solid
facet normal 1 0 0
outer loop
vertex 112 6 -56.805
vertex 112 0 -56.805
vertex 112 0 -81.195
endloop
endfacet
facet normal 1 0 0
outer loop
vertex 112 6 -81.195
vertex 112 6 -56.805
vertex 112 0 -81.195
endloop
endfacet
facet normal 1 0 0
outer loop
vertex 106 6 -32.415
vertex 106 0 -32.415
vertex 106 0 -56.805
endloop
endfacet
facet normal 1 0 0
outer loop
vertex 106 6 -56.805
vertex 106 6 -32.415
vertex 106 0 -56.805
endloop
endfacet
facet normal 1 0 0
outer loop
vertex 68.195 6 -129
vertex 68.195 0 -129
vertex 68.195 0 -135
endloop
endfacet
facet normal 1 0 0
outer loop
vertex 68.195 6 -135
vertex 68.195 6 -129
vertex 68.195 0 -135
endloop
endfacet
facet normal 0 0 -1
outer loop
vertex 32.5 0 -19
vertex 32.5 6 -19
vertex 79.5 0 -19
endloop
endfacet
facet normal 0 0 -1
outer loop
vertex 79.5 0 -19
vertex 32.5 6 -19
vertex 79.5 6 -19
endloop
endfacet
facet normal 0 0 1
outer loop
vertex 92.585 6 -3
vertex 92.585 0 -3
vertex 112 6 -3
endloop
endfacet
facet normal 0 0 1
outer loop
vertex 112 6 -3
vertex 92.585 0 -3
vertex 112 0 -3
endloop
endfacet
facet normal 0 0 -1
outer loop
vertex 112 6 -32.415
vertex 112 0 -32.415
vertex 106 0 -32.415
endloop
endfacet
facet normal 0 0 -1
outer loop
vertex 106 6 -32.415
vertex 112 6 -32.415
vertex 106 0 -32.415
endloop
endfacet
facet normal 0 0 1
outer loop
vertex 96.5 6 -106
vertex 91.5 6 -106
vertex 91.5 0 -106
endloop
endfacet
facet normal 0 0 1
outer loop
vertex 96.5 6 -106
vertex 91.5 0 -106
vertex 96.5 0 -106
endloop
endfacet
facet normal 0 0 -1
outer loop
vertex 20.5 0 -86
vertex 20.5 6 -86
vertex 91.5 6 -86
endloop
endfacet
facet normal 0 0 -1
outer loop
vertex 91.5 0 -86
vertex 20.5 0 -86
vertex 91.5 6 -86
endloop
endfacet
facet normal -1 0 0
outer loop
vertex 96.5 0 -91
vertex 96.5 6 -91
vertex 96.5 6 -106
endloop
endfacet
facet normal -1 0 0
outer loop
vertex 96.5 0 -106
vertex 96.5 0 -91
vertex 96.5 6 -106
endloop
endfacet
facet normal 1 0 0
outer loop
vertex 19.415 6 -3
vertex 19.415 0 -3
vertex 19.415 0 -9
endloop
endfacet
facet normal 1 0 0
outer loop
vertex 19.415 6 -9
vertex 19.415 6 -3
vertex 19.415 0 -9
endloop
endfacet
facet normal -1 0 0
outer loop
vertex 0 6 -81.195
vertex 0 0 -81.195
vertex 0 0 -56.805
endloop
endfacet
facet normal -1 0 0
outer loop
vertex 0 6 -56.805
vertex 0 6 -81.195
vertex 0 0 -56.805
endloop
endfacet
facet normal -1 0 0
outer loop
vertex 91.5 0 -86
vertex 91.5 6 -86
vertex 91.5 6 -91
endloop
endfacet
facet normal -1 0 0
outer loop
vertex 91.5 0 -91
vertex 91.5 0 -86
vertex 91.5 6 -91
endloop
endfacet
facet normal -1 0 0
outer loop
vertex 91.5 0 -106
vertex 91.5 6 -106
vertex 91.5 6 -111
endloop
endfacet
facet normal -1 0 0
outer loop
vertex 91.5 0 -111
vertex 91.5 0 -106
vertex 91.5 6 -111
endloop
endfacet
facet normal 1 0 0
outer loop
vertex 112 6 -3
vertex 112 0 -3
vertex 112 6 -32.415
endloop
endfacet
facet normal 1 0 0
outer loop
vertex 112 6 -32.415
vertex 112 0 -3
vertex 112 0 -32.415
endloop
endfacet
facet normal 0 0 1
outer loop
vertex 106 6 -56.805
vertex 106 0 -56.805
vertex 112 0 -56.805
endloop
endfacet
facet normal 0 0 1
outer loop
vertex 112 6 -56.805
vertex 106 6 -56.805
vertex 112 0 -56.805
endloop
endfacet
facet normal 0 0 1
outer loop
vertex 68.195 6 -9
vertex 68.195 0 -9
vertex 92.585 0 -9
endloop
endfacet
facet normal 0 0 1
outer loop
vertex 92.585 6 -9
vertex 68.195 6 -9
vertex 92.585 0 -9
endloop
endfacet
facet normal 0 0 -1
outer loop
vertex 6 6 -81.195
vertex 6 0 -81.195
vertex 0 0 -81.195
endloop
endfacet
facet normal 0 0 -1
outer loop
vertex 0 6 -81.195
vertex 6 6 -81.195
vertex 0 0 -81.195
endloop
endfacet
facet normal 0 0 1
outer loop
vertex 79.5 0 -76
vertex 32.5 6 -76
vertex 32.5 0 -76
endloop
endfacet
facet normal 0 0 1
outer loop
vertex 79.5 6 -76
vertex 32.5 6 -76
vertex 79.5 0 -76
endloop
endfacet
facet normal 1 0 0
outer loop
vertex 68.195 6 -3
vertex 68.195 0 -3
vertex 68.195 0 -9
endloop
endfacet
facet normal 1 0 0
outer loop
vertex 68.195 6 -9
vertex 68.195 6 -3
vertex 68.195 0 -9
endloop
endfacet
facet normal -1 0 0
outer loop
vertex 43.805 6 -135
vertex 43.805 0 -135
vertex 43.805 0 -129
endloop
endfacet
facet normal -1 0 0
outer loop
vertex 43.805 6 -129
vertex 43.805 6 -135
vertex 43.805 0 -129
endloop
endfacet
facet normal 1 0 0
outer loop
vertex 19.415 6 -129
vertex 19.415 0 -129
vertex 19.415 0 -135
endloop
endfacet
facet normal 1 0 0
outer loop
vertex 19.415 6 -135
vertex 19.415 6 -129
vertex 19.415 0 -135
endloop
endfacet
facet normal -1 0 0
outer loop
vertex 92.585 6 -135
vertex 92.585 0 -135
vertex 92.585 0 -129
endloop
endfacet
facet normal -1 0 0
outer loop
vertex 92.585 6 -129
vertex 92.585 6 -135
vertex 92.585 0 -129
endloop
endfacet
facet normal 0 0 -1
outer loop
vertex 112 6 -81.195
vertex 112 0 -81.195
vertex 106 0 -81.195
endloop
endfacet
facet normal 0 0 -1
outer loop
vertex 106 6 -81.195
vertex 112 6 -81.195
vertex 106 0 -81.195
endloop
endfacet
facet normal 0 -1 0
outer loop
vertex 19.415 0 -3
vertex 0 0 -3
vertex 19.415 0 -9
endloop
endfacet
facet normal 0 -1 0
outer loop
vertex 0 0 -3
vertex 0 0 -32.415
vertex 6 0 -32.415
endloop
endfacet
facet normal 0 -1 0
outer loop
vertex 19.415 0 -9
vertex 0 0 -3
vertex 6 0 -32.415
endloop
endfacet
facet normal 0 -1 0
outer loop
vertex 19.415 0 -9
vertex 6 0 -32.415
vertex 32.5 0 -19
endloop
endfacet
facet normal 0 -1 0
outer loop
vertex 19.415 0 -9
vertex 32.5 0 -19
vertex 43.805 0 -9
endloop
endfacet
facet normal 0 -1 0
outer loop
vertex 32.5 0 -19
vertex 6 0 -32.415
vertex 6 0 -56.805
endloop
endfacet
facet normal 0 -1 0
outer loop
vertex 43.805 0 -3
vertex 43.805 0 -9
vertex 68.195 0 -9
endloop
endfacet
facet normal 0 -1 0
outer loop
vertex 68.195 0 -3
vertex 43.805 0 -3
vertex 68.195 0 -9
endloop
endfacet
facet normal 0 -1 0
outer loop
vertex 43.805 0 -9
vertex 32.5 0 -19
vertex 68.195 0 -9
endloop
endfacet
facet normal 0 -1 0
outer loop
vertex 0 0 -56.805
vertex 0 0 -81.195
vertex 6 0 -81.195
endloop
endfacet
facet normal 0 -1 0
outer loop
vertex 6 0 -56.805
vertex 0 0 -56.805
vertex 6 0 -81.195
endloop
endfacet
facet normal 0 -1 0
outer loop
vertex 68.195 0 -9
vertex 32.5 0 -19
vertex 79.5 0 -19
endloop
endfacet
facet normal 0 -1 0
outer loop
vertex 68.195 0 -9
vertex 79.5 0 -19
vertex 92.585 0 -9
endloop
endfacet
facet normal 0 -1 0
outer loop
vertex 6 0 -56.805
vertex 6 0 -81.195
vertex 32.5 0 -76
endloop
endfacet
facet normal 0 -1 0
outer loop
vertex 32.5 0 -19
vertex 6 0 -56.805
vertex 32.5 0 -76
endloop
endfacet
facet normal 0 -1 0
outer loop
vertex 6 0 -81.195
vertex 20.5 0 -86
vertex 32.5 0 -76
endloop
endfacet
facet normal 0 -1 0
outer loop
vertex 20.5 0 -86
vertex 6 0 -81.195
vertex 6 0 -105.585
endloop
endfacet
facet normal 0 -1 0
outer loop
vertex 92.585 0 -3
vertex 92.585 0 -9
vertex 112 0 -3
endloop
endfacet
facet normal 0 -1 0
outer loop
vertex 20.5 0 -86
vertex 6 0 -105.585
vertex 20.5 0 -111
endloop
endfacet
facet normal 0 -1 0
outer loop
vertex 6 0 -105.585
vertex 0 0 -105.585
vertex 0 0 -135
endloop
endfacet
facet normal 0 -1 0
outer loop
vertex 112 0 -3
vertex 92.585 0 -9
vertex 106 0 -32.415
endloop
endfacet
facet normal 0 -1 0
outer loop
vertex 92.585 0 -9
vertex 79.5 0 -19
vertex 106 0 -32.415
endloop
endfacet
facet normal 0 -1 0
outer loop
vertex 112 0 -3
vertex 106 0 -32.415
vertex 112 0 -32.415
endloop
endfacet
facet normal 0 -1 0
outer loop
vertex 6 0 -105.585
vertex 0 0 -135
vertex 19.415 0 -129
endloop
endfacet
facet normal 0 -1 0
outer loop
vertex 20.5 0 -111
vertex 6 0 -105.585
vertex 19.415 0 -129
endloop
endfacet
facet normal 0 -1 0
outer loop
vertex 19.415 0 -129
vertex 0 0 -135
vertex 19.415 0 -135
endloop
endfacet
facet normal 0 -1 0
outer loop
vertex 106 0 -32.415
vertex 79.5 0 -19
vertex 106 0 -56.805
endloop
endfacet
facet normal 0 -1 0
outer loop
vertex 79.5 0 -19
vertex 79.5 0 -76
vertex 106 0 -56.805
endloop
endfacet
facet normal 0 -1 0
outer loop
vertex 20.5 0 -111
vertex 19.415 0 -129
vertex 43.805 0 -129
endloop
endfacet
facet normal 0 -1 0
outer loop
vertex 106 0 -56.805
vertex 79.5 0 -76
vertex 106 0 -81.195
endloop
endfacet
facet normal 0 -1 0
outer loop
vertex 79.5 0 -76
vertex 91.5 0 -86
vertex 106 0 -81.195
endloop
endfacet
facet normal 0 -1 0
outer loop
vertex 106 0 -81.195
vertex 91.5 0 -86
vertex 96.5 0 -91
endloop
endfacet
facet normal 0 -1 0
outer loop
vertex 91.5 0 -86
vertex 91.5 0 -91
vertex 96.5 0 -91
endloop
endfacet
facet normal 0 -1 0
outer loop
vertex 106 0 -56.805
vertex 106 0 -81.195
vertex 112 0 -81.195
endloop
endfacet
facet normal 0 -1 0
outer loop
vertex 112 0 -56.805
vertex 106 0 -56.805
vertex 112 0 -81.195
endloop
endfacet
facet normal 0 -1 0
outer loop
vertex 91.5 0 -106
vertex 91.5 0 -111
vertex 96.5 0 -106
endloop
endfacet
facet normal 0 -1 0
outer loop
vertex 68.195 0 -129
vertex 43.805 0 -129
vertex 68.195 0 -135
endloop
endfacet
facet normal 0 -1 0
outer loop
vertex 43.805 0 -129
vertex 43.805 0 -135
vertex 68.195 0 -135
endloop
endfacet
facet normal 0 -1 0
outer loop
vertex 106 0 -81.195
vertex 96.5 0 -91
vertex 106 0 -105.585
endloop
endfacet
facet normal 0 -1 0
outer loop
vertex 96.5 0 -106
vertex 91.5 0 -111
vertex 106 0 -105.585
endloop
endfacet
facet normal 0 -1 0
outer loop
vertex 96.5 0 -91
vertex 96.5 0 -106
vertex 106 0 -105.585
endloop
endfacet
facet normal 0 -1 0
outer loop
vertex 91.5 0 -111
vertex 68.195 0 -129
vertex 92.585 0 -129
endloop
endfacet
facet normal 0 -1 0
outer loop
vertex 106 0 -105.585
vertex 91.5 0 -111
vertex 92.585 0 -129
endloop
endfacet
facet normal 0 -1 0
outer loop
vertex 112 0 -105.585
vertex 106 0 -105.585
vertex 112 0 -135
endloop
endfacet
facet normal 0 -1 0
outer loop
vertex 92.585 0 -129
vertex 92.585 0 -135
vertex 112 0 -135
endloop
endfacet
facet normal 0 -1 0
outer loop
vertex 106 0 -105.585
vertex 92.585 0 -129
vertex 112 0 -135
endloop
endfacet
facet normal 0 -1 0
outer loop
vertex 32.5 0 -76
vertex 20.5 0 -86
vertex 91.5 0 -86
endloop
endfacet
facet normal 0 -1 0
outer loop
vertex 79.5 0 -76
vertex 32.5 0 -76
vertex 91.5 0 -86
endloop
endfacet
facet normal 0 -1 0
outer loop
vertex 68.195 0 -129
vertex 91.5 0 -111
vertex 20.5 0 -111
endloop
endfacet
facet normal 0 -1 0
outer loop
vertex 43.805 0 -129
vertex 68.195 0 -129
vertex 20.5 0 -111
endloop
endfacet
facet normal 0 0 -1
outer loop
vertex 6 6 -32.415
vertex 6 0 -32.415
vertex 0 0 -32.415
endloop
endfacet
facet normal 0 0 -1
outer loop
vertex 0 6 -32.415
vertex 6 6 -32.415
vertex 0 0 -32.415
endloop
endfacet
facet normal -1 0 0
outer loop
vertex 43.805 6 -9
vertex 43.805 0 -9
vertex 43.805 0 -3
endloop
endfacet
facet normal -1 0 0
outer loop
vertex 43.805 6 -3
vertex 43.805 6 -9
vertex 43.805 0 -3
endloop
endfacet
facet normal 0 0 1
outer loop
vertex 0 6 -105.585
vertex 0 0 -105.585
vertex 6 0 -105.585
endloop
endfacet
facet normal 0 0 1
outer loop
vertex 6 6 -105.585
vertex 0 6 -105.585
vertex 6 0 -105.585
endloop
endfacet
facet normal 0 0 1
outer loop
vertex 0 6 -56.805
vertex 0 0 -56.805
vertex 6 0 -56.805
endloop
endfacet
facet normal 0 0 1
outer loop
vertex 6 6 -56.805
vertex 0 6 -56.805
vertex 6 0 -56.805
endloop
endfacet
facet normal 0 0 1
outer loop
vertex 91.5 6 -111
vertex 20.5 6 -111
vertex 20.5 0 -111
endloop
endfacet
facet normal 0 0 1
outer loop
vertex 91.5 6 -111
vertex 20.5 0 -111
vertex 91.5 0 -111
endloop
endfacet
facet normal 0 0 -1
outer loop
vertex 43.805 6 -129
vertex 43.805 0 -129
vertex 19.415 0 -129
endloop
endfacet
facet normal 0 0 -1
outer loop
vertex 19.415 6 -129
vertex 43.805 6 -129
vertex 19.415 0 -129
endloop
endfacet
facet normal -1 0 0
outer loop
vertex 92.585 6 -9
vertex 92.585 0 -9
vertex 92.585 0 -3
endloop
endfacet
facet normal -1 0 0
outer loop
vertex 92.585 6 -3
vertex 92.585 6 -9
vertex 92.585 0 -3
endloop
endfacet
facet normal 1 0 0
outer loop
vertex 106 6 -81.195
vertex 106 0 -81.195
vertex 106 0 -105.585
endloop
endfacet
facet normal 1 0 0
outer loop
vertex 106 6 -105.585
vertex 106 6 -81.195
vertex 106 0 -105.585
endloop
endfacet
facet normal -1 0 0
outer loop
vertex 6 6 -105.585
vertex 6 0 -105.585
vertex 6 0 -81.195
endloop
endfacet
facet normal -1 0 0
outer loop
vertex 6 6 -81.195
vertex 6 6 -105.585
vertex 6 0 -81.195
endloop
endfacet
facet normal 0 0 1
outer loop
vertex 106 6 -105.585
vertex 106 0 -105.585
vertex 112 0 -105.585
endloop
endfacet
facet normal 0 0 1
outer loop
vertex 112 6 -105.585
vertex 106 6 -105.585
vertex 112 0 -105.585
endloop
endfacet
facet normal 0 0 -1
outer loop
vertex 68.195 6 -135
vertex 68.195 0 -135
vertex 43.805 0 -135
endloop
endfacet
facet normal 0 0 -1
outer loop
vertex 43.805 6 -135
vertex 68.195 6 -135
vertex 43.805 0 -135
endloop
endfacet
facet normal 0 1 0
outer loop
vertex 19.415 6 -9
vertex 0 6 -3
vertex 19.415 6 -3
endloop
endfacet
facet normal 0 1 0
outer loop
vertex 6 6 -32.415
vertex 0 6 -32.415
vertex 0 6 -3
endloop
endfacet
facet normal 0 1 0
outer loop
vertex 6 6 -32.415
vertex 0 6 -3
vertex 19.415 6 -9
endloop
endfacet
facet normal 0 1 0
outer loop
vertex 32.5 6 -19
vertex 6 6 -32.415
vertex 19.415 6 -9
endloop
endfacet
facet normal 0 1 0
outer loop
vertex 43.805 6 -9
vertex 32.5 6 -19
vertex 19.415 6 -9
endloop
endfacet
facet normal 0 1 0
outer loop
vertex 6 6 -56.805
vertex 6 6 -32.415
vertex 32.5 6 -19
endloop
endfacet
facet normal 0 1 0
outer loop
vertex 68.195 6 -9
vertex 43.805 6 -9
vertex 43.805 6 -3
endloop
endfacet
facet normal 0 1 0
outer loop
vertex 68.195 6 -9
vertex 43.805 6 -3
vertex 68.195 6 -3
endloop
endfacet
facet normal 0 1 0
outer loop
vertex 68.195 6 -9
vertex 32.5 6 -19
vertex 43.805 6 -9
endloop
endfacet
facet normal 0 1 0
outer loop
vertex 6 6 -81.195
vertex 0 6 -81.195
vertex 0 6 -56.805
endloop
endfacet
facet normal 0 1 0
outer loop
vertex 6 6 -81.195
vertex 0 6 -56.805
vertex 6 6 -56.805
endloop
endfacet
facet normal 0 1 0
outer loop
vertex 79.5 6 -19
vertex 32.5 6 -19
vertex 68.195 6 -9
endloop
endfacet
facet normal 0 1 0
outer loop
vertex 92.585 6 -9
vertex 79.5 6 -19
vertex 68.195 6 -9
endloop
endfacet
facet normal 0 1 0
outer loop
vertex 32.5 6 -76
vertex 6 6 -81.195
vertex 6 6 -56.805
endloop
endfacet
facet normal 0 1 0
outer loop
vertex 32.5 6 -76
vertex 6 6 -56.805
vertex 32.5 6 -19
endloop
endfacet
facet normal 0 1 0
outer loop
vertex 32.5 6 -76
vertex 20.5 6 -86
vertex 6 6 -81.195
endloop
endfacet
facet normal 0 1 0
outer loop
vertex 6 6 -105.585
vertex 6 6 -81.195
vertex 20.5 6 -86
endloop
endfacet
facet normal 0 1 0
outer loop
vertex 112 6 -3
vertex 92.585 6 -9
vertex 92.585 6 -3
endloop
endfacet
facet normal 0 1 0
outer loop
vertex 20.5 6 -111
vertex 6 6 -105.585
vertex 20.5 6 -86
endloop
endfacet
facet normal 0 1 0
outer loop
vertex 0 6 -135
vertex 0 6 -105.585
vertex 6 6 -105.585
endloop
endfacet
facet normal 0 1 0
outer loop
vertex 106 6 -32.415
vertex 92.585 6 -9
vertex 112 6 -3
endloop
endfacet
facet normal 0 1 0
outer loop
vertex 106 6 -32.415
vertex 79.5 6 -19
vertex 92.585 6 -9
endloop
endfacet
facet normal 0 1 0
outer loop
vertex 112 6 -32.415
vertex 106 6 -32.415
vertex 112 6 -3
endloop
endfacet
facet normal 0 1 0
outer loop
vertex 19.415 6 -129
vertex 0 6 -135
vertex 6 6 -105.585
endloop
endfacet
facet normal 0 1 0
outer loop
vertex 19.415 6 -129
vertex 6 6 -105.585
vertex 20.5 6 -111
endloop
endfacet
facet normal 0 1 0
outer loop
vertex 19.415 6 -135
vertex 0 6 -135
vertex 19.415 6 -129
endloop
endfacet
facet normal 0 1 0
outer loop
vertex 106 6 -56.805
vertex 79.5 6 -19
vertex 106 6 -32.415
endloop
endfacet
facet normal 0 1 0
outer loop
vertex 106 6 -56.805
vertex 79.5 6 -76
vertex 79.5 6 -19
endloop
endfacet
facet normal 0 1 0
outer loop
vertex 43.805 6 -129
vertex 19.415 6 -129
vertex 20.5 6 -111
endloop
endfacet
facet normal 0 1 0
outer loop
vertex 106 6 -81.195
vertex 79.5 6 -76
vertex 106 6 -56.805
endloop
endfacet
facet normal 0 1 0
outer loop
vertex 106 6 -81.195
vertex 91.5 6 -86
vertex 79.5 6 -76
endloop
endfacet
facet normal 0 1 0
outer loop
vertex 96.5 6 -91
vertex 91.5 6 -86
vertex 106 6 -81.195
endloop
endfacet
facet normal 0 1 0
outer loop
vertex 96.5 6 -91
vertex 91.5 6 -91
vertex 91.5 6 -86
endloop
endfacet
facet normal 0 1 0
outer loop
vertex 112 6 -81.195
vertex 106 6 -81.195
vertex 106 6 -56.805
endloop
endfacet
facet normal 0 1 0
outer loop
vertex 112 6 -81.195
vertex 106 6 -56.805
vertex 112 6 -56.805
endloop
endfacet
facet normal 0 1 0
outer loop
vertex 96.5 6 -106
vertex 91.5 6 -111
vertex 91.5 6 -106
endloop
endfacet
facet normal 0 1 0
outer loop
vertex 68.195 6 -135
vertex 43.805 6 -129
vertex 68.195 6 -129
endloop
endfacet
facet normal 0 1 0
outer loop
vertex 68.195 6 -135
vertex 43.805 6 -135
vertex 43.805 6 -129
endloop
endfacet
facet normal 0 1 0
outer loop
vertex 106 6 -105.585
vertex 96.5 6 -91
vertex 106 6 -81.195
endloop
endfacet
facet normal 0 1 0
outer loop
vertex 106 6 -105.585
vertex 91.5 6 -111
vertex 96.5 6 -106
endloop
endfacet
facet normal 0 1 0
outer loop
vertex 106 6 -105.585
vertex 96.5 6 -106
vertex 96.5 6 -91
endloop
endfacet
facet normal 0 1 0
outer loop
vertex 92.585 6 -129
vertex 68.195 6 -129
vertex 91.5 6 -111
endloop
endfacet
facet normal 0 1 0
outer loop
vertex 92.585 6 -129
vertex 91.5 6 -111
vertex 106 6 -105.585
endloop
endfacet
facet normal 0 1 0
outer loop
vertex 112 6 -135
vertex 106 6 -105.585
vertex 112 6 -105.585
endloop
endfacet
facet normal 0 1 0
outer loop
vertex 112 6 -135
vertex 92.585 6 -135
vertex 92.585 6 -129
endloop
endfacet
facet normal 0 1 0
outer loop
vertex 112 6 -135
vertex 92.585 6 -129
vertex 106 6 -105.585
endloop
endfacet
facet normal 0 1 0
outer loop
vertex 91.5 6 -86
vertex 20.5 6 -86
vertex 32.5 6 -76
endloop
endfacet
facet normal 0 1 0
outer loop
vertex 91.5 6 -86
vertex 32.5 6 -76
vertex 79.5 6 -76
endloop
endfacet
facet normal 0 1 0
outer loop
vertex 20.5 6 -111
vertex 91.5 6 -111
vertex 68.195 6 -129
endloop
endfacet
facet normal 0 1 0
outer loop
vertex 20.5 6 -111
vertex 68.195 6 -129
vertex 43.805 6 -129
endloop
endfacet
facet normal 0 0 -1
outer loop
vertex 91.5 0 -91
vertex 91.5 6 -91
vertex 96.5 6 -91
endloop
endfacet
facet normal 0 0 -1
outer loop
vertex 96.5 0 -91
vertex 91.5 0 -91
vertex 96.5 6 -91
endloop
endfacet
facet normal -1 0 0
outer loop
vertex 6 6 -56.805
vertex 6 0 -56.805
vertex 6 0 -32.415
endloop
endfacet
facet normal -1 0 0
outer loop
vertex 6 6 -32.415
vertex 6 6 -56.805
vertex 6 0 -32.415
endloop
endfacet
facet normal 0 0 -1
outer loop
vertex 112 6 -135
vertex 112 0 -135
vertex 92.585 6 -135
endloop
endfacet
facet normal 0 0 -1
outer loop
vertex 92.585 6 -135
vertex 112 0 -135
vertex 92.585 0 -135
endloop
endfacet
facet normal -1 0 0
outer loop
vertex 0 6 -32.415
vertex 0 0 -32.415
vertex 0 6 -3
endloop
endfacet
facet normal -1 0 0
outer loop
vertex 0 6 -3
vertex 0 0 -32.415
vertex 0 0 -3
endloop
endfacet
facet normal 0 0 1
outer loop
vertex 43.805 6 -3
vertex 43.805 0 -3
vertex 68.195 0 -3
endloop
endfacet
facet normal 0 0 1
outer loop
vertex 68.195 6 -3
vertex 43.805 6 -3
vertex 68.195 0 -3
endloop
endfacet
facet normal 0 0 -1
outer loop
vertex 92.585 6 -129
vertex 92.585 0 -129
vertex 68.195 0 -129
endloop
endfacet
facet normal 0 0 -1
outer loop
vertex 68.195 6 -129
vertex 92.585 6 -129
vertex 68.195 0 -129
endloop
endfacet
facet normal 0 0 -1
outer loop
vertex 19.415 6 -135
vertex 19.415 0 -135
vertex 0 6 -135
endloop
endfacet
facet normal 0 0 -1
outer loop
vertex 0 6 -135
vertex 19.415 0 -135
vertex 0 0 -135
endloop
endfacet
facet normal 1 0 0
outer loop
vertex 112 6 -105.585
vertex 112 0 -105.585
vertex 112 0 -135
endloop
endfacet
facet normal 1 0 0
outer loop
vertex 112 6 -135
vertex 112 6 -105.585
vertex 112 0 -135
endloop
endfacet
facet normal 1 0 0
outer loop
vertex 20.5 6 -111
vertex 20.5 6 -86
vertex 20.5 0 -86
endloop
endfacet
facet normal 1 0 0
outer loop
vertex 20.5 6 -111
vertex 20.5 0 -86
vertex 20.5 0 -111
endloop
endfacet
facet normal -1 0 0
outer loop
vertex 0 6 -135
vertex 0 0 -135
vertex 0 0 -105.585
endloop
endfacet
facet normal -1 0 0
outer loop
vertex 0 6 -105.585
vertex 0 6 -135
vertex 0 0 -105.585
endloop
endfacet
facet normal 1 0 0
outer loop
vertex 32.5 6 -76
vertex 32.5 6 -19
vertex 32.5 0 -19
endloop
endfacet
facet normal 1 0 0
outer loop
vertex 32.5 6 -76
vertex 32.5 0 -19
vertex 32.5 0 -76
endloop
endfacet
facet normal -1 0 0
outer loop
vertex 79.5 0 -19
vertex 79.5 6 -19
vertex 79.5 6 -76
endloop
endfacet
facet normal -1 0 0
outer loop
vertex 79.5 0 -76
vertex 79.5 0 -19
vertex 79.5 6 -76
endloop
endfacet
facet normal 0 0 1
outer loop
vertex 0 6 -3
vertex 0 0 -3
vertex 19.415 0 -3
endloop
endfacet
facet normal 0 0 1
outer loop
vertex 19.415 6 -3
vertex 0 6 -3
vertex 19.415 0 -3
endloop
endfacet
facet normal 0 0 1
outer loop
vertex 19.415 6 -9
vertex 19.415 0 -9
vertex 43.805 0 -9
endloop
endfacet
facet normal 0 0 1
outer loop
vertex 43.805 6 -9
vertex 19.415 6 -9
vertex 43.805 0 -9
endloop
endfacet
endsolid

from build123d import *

# Parameters (mm, degrees)
BOSS_EXTRUDE1_DEPTH = 6
SKETCH2_W           = 71
SKETCH2_H           = 25
SKETCH2_W_2         = 5
SKETCH2_H_2         = 15
SKETCH2_W_3         = 47
SKETCH2_H_3         = 57
CUT_EXTRUDE1_DEPTH  = 176.513532242


with BuildPart() as part:
    # Sketch1 → Boss-Extrude1 (new body)
    with BuildSketch(Plane(origin=(0, 0, 0), x_dir=(1, 0, 0), z_dir=(0, 1, 0))):
        Polygon((0, 135), (0, 105.585), (6, 105.585), (6, 81.195), (0, 81.195), (0, 56.805), (6, 56.805), (6, 32.415), (0, 32.415), (0, 8.025), (0, 3), (19.415, 3), (19.415, 9), (43.805, 9), (43.805, 3), (68.195, 3), (68.195, 9), (92.585, 9), (92.585, 3), (112, 3), (112, 32.415), (106, 32.415), (106, 56.805), (112, 56.805), (112, 81.195), (106, 81.195), (106, 105.585), (112, 105.585), (112, 129.975), (112, 135), (92.585, 135), (92.585, 129), (68.195, 129), (68.195, 135), (43.805, 135), (43.805, 129), (19.415, 129), (19.415, 135), align=None)
    extrude(amount=BOSS_EXTRUDE1_DEPTH)

    # Sketch2 → Cut-Extrude1 (cut, through all)
    with BuildSketch(Plane(origin=(0, 6, 0), x_dir=(1, 0, 0), z_dir=(0, 1, 0))):
        with Locations((56, 98.5)):
            Rectangle(SKETCH2_W, SKETCH2_H)
        with Locations((94, 98.5)):
            Rectangle(SKETCH2_W_2, SKETCH2_H_2)
        with Locations((56, 47.5)):
            Rectangle(SKETCH2_W_3, SKETCH2_H_3)
    extrude(amount=-CUT_EXTRUDE1_DEPTH, mode=Mode.SUBTRACT)


solid = part.part
